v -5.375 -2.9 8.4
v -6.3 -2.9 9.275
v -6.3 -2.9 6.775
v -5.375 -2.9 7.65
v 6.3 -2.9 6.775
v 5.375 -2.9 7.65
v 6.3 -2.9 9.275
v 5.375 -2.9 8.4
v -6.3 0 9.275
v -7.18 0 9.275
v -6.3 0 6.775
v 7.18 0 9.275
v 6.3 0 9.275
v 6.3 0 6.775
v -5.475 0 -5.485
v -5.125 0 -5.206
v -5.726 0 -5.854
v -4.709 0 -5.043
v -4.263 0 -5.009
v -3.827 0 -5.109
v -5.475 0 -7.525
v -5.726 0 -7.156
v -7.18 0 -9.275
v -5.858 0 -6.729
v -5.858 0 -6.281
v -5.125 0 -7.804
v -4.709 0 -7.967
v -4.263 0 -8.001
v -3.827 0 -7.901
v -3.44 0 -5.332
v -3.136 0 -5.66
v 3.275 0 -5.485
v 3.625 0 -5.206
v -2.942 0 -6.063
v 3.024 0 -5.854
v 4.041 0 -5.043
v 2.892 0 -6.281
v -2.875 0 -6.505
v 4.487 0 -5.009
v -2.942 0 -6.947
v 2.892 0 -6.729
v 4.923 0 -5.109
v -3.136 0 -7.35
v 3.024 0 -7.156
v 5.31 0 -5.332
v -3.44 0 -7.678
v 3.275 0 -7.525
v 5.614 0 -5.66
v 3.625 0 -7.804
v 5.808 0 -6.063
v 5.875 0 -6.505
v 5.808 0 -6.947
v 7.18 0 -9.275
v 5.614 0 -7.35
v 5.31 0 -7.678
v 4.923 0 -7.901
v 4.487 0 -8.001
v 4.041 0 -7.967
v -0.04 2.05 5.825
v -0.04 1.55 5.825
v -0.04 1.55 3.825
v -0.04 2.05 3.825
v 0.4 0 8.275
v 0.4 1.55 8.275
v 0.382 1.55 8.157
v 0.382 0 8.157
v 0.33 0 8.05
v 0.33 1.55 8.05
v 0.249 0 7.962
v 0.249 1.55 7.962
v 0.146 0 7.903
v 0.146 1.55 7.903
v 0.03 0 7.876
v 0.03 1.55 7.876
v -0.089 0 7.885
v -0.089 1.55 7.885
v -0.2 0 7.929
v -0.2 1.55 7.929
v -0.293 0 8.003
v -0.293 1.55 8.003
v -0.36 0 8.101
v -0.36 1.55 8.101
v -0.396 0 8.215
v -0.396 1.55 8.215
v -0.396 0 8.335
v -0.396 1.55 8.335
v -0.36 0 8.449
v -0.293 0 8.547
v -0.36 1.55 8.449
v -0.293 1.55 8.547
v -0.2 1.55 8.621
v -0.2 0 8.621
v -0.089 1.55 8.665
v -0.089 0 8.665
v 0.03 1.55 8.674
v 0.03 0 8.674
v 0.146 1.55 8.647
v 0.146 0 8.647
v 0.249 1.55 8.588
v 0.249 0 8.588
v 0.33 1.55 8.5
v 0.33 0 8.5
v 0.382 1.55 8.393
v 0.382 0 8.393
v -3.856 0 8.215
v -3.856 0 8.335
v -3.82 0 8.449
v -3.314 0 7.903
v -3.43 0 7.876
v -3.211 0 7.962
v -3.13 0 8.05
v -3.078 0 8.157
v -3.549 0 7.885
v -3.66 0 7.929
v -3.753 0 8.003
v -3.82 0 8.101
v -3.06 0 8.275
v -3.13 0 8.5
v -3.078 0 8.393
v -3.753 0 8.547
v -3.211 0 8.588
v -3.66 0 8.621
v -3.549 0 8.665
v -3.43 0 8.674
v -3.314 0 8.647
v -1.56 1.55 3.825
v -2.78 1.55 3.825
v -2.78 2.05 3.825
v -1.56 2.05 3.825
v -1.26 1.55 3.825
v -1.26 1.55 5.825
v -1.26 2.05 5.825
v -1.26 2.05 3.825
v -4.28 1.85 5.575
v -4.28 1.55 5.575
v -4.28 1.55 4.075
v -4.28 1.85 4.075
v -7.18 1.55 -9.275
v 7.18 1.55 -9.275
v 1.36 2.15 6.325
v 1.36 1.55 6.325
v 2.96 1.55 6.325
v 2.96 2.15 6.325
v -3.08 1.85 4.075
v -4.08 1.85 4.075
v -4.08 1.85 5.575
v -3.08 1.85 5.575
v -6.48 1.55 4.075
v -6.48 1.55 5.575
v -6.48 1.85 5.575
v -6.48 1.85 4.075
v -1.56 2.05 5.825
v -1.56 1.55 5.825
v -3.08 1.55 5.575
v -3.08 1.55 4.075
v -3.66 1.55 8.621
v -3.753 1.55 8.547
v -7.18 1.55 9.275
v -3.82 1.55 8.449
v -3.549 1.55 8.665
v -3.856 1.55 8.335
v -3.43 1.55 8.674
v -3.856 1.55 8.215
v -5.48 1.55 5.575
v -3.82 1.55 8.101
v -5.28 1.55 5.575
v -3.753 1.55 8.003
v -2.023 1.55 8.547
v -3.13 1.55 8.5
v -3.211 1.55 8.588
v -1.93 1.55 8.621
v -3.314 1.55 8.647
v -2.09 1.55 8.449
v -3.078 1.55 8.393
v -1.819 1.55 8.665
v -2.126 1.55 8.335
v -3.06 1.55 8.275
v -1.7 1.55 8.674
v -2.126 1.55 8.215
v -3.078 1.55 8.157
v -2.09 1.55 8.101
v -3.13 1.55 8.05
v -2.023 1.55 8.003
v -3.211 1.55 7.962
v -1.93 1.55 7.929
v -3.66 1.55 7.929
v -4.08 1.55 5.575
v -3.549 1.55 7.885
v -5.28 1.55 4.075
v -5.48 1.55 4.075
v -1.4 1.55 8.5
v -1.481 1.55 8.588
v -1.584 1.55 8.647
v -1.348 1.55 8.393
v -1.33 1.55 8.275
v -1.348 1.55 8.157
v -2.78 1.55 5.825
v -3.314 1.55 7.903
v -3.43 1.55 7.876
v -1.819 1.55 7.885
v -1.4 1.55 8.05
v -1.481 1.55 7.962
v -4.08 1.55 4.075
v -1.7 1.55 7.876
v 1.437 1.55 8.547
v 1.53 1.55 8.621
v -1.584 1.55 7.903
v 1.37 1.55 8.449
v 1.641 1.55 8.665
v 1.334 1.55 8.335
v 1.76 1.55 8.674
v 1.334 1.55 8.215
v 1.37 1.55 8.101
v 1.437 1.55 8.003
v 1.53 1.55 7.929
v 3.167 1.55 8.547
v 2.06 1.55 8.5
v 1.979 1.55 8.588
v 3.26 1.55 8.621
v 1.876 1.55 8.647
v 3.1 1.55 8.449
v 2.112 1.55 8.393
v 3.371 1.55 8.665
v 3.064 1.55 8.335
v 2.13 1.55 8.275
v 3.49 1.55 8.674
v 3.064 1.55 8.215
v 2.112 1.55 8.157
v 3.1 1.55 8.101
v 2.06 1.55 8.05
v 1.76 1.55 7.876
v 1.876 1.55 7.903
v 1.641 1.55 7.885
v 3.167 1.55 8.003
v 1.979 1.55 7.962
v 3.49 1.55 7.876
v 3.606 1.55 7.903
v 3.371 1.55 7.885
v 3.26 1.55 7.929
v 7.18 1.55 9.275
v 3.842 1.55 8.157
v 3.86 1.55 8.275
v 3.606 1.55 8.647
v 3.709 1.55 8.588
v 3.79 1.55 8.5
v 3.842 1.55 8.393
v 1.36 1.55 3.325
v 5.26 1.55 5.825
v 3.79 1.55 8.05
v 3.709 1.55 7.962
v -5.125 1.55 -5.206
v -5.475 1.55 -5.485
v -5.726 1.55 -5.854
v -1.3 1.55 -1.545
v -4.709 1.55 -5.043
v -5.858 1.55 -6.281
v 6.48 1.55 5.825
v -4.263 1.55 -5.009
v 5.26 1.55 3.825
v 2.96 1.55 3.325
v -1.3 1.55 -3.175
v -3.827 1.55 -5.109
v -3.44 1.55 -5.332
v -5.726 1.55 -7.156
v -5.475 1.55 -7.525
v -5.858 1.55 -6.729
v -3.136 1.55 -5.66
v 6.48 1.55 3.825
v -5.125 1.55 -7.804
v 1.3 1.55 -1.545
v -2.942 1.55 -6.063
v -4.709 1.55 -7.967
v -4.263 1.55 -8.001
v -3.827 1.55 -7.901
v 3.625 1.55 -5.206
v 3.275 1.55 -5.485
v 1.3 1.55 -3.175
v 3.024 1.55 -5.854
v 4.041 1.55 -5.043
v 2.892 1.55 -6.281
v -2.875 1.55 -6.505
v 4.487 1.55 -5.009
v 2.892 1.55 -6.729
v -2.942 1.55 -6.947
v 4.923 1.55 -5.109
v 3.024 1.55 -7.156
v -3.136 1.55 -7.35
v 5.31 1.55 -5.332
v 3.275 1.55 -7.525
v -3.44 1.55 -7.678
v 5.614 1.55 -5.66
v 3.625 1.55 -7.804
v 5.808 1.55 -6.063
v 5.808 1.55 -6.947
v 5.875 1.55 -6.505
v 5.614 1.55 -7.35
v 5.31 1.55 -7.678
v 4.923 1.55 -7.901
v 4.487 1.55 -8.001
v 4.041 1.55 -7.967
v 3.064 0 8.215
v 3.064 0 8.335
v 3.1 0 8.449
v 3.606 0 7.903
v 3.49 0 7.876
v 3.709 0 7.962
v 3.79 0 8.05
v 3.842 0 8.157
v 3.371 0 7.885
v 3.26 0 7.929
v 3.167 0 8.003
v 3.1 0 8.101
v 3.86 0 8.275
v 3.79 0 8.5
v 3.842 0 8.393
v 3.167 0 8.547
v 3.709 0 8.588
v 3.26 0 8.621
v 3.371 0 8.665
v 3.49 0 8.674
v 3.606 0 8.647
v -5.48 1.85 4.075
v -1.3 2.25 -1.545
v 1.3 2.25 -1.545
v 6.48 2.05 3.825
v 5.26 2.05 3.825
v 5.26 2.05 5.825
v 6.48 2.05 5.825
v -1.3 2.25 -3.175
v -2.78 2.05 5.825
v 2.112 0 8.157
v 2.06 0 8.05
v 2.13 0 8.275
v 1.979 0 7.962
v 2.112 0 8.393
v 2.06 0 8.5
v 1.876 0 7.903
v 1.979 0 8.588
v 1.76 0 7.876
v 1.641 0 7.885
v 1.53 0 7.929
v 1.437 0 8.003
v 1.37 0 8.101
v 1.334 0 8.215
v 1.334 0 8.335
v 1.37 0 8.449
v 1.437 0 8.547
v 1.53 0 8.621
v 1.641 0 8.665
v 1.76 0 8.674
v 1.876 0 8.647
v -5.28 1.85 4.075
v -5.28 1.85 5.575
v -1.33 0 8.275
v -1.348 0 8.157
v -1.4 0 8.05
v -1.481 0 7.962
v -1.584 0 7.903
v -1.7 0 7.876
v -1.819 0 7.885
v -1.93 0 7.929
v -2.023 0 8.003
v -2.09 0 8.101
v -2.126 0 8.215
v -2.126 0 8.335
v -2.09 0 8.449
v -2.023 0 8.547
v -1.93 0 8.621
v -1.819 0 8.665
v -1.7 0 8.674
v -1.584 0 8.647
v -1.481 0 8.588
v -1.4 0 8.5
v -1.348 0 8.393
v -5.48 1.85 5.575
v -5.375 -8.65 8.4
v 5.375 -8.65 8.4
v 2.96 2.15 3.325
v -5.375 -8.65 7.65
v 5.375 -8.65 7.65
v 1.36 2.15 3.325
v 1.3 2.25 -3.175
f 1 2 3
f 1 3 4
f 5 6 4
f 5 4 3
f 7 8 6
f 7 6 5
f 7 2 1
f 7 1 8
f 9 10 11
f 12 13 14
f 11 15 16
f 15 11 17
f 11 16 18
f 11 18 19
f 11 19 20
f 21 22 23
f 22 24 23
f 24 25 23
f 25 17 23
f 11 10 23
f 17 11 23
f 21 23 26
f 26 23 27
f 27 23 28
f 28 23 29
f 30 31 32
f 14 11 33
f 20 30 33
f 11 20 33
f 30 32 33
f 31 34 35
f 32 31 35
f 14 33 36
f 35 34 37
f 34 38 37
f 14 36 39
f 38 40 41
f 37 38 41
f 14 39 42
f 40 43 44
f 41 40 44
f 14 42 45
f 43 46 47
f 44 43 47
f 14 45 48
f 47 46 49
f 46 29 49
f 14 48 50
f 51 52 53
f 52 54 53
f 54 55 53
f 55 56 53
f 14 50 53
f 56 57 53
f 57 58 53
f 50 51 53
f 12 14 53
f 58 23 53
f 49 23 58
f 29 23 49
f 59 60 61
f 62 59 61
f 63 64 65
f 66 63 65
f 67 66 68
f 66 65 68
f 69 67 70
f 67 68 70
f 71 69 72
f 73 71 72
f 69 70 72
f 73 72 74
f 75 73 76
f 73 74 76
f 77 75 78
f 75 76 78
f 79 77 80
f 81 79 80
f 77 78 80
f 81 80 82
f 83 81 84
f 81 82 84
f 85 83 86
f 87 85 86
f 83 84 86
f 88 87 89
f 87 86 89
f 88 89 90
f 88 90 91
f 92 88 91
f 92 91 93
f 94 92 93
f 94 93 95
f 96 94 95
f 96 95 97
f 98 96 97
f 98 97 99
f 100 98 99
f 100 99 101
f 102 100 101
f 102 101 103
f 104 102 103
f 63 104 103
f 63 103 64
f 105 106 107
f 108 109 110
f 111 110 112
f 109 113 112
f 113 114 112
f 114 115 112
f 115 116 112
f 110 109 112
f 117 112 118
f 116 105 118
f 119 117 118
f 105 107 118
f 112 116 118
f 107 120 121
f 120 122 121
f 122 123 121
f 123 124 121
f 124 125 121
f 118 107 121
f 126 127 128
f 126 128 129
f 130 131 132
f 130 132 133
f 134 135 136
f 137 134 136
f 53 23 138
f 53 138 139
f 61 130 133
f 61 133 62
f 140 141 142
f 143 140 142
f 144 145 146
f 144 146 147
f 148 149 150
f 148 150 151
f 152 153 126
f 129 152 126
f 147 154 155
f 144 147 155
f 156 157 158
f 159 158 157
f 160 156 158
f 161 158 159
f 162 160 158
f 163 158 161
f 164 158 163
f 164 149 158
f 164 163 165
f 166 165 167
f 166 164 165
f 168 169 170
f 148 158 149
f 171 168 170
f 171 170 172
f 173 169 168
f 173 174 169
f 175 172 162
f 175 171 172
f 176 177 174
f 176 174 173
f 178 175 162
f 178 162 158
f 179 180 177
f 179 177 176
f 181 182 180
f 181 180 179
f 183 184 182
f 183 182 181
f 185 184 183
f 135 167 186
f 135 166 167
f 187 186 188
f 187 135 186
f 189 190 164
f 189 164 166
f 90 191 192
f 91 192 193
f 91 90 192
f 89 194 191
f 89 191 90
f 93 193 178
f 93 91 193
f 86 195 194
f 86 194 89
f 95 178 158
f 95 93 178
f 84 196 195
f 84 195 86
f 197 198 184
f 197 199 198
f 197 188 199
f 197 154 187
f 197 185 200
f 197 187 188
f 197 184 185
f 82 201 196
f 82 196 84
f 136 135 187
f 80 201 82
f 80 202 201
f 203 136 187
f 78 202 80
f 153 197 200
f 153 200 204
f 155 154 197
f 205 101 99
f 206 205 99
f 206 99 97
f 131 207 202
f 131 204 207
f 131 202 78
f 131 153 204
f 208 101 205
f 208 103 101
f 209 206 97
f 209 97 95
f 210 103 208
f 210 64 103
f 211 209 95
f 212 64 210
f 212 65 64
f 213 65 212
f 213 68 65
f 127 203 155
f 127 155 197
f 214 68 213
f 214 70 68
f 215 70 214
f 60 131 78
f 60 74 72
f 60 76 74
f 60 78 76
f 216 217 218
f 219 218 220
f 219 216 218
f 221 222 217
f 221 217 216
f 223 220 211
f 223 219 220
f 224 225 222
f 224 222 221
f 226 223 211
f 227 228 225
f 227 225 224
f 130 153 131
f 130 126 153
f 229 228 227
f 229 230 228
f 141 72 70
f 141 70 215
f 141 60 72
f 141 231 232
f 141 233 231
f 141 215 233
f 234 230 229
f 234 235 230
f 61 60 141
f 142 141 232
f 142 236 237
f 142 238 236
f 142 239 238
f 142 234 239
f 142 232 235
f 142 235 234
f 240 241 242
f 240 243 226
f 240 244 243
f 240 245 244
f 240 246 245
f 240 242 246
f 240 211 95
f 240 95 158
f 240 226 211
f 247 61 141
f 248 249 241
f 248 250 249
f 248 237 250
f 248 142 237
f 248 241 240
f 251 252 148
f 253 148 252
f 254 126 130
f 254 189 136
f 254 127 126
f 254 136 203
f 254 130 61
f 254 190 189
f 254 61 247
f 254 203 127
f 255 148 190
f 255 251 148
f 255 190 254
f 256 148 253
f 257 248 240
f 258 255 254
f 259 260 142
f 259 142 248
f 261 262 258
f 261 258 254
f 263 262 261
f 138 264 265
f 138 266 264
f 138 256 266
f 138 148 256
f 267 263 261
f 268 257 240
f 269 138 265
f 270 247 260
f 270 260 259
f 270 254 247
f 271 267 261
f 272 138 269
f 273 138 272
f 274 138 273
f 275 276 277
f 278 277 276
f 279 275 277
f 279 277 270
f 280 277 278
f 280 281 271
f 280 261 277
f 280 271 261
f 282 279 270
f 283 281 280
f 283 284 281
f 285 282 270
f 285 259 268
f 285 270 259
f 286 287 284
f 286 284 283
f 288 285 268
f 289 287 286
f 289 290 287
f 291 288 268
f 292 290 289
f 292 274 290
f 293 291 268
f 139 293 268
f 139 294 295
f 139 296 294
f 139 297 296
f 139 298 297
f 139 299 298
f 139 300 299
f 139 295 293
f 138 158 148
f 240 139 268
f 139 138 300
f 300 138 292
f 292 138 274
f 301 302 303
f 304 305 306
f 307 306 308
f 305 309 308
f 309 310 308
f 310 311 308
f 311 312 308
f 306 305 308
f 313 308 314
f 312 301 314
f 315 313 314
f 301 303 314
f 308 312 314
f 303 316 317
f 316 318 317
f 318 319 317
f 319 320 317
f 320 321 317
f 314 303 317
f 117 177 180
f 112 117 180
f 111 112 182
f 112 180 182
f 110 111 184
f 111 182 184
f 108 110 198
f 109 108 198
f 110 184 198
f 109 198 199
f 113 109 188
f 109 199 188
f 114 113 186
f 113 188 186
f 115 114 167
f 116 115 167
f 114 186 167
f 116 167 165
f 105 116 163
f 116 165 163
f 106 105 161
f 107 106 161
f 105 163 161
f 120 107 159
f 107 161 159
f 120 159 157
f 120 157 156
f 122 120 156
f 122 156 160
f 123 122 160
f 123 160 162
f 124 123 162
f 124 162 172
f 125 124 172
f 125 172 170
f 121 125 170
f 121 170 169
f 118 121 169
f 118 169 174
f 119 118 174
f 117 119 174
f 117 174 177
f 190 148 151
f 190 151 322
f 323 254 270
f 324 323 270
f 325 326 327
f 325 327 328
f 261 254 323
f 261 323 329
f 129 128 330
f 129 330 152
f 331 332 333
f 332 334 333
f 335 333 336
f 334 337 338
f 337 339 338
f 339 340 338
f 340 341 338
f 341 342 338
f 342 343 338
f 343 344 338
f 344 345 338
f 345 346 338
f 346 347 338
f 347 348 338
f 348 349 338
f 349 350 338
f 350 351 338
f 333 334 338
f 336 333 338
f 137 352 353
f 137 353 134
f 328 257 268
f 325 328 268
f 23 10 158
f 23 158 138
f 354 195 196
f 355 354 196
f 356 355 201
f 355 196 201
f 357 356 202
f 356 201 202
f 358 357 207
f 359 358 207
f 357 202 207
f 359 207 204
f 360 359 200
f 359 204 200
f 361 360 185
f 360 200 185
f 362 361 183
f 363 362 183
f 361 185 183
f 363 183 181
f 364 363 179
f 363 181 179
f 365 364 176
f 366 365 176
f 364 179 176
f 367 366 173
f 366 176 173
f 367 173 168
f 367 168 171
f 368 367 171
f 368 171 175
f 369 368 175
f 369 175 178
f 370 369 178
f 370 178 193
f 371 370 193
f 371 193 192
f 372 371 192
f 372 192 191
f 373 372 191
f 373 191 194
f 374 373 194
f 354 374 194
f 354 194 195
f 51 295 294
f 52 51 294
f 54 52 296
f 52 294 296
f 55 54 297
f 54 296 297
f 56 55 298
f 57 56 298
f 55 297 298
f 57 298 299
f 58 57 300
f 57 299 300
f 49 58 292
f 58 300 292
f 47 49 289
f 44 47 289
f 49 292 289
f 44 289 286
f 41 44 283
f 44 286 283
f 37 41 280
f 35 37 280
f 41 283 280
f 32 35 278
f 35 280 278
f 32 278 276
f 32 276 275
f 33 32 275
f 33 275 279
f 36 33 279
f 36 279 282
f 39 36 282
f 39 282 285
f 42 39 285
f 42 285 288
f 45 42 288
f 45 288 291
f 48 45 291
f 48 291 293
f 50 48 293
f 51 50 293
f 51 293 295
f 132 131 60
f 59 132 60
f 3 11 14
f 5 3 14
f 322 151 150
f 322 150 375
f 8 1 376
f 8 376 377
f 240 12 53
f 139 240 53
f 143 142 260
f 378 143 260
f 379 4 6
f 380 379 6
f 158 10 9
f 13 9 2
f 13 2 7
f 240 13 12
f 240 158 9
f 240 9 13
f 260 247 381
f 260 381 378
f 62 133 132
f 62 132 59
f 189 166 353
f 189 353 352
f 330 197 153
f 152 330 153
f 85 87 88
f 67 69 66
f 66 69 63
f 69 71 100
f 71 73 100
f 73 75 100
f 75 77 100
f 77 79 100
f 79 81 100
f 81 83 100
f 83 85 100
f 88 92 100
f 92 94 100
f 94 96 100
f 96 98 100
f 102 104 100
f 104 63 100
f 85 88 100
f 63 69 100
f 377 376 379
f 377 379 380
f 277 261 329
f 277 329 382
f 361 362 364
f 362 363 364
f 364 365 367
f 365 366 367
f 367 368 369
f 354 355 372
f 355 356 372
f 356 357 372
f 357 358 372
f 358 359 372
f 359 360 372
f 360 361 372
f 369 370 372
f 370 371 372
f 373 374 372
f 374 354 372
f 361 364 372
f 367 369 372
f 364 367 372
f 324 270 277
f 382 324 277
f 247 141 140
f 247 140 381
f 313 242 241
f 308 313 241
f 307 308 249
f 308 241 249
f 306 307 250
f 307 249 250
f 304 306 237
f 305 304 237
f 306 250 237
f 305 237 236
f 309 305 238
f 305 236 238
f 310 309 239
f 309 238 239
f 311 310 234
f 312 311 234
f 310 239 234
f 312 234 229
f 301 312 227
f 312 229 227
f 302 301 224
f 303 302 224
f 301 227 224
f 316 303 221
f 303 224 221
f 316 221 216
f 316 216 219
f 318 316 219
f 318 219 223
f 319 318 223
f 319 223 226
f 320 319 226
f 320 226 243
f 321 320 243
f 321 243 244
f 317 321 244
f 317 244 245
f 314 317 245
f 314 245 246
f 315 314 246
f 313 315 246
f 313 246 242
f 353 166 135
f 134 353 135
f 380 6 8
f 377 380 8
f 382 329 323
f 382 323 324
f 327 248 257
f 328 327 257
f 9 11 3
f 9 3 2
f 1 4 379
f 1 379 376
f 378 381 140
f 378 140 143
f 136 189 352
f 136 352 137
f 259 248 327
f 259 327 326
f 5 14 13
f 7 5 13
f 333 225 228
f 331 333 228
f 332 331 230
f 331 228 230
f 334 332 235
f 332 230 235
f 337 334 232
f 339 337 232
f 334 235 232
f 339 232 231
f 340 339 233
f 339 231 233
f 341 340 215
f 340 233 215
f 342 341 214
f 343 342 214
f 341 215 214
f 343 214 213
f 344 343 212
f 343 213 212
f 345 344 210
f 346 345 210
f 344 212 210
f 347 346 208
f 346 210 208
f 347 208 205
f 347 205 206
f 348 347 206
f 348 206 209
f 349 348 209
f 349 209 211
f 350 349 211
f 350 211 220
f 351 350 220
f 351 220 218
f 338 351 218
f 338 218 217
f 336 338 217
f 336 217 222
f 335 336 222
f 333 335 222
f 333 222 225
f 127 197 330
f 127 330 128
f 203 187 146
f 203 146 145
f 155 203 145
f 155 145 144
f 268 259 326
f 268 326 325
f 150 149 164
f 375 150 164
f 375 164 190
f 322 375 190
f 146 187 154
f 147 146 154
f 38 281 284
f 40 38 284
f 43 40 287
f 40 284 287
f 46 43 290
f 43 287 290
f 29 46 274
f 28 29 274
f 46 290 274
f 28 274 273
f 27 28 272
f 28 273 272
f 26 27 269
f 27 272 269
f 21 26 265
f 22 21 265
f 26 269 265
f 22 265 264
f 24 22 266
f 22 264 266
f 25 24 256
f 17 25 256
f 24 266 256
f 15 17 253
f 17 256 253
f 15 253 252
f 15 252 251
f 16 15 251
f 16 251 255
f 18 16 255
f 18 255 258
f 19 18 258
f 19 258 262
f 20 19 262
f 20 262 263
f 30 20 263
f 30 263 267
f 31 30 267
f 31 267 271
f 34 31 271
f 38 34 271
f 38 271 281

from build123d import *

# Parameters (mm, degrees)
SKETCH1_W           = 14.36
SKETCH1_H           = 18.55
BOSS_EXTRUDE1_DEPTH = 1.55
SKETCH2_R           = 1.5
SKETCH2_R_2         = 0.4
CUT_EXTRUDE1_DEPTH  = 2.55
SKETCH5_W           = 2.6
SKETCH5_H           = 1.63
SENSOR_DEPTH        = 0.7
SKETCH6_W           = 1
SKETCH6_H           = 1.5
CAPACITORS1_DEPTH   = 0.3
SKETCH7_W           = 1.22
SKETCH7_H           = 2
CAPACITORS2_DEPTH   = 0.5
SKETCH8_W           = 1.6
SKETCH8_H           = 3
MISC_CHIP1_DEPTH    = 0.6
SKETCH10_W          = 12.6
SKETCH10_H          = 2.5
BOSS_EXTRUDE2_DEPTH = 2.9
SKETCH12_W          = 10.75
SKETCH12_H          = 0.75
BOSS_EXTRUDE3_DEPTH = 5.75


with BuildPart() as part:
    # Sketch1 → Boss-Extrude1 (new body)
    with BuildSketch(Plane(origin=(0, 0, 0), x_dir=(1, 0, 0), z_dir=(0, 1, 0))):
        Rectangle(SKETCH1_W, SKETCH1_H)
    extrude(amount=BOSS_EXTRUDE1_DEPTH)

    # Sketch2 → Cut-Extrude1 (cut, through all)
    with BuildSketch(Plane(origin=(0, 1.55, 0), x_dir=(1, 0, 0), z_dir=(0, 1, 0))):
        with Locations((-4.375, 6.505)):
            Circle(SKETCH2_R)
        with Locations((4.375, 6.505)):
            Circle(SKETCH2_R)
        with Locations((-1.73, -8.275)):
            Circle(SKETCH2_R_2)
        with Locations((1.73, -8.275)):
            Circle(SKETCH2_R_2)
        with Locations((3.46, -8.275)):
            Circle(SKETCH2_R_2)
        with Locations((-3.46, -8.275)):
            Circle(SKETCH2_R_2)
        with Locations((0, -8.275)):
            Circle(SKETCH2_R_2)
    extrude(amount=-CUT_EXTRUDE1_DEPTH, mode=Mode.SUBTRACT)

    # Sketch5 → Sensor (add)
    with BuildSketch(Plane(origin=(0, 1.55, 0), x_dir=(1, 0, 0), z_dir=(0, 1, 0))):
        with Locations((0, 2.36)):
            Rectangle(SKETCH5_W, SKETCH5_H)
    extrude(amount=SENSOR_DEPTH)

    # Sketch6 → Capacitors1 (add)
    with BuildSketch(Plane(origin=(0, 1.55, 0), x_dir=(1, 0, 0), z_dir=(0, 1, 0))):
        with Locations((-5.98, -4.825)):
            Rectangle(SKETCH6_W, SKETCH6_H)
        with Locations((-4.78, -4.825)):
            Rectangle(SKETCH6_W, SKETCH6_H)
        with Locations((-3.58, -4.825)):
            Rectangle(SKETCH6_W, SKETCH6_H)
    extrude(amount=CAPACITORS1_DEPTH)

    # Sketch7 → Capacitors2 (add)
    with BuildSketch(Plane(origin=(0, 1.55, 0), x_dir=(1, 0, 0), z_dir=(0, 1, 0))):
        with Locations((-2.17, -4.825)):
            Rectangle(SKETCH7_W, SKETCH7_H)
        with Locations((-0.65, -4.825)):
            Rectangle(SKETCH7_W, SKETCH7_H)
        with Locations((5.87, -4.825)):
            Rectangle(SKETCH7_W, SKETCH7_H)
    extrude(amount=CAPACITORS2_DEPTH)

    # Sketch8 → misc.chip1 (add)
    with BuildSketch(Plane(origin=(0, 1.55, 0), x_dir=(1, 0, 0), z_dir=(0, 1, 0))):
        with Locations((2.16, -4.825)):
            Rectangle(SKETCH8_W, SKETCH8_H)
    extrude(amount=MISC_CHIP1_DEPTH)

    # Sketch10 → Boss-Extrude2 (add)
    with BuildSketch(Plane.XZ):
        with Locations((0, 8.025)):
            Rectangle(SKETCH10_W, SKETCH10_H)
    extrude(amount=BOSS_EXTRUDE2_DEPTH)

    # Sketch12 → Boss-Extrude3 (add)
    with BuildSketch(Plane.XZ.offset(2.9)):
        with Locations((0, 8.025)):
            Rectangle(SKETCH12_W, SKETCH12_H)
    extrude(amount=BOSS_EXTRUDE3_DEPTH)


solid = part.part
